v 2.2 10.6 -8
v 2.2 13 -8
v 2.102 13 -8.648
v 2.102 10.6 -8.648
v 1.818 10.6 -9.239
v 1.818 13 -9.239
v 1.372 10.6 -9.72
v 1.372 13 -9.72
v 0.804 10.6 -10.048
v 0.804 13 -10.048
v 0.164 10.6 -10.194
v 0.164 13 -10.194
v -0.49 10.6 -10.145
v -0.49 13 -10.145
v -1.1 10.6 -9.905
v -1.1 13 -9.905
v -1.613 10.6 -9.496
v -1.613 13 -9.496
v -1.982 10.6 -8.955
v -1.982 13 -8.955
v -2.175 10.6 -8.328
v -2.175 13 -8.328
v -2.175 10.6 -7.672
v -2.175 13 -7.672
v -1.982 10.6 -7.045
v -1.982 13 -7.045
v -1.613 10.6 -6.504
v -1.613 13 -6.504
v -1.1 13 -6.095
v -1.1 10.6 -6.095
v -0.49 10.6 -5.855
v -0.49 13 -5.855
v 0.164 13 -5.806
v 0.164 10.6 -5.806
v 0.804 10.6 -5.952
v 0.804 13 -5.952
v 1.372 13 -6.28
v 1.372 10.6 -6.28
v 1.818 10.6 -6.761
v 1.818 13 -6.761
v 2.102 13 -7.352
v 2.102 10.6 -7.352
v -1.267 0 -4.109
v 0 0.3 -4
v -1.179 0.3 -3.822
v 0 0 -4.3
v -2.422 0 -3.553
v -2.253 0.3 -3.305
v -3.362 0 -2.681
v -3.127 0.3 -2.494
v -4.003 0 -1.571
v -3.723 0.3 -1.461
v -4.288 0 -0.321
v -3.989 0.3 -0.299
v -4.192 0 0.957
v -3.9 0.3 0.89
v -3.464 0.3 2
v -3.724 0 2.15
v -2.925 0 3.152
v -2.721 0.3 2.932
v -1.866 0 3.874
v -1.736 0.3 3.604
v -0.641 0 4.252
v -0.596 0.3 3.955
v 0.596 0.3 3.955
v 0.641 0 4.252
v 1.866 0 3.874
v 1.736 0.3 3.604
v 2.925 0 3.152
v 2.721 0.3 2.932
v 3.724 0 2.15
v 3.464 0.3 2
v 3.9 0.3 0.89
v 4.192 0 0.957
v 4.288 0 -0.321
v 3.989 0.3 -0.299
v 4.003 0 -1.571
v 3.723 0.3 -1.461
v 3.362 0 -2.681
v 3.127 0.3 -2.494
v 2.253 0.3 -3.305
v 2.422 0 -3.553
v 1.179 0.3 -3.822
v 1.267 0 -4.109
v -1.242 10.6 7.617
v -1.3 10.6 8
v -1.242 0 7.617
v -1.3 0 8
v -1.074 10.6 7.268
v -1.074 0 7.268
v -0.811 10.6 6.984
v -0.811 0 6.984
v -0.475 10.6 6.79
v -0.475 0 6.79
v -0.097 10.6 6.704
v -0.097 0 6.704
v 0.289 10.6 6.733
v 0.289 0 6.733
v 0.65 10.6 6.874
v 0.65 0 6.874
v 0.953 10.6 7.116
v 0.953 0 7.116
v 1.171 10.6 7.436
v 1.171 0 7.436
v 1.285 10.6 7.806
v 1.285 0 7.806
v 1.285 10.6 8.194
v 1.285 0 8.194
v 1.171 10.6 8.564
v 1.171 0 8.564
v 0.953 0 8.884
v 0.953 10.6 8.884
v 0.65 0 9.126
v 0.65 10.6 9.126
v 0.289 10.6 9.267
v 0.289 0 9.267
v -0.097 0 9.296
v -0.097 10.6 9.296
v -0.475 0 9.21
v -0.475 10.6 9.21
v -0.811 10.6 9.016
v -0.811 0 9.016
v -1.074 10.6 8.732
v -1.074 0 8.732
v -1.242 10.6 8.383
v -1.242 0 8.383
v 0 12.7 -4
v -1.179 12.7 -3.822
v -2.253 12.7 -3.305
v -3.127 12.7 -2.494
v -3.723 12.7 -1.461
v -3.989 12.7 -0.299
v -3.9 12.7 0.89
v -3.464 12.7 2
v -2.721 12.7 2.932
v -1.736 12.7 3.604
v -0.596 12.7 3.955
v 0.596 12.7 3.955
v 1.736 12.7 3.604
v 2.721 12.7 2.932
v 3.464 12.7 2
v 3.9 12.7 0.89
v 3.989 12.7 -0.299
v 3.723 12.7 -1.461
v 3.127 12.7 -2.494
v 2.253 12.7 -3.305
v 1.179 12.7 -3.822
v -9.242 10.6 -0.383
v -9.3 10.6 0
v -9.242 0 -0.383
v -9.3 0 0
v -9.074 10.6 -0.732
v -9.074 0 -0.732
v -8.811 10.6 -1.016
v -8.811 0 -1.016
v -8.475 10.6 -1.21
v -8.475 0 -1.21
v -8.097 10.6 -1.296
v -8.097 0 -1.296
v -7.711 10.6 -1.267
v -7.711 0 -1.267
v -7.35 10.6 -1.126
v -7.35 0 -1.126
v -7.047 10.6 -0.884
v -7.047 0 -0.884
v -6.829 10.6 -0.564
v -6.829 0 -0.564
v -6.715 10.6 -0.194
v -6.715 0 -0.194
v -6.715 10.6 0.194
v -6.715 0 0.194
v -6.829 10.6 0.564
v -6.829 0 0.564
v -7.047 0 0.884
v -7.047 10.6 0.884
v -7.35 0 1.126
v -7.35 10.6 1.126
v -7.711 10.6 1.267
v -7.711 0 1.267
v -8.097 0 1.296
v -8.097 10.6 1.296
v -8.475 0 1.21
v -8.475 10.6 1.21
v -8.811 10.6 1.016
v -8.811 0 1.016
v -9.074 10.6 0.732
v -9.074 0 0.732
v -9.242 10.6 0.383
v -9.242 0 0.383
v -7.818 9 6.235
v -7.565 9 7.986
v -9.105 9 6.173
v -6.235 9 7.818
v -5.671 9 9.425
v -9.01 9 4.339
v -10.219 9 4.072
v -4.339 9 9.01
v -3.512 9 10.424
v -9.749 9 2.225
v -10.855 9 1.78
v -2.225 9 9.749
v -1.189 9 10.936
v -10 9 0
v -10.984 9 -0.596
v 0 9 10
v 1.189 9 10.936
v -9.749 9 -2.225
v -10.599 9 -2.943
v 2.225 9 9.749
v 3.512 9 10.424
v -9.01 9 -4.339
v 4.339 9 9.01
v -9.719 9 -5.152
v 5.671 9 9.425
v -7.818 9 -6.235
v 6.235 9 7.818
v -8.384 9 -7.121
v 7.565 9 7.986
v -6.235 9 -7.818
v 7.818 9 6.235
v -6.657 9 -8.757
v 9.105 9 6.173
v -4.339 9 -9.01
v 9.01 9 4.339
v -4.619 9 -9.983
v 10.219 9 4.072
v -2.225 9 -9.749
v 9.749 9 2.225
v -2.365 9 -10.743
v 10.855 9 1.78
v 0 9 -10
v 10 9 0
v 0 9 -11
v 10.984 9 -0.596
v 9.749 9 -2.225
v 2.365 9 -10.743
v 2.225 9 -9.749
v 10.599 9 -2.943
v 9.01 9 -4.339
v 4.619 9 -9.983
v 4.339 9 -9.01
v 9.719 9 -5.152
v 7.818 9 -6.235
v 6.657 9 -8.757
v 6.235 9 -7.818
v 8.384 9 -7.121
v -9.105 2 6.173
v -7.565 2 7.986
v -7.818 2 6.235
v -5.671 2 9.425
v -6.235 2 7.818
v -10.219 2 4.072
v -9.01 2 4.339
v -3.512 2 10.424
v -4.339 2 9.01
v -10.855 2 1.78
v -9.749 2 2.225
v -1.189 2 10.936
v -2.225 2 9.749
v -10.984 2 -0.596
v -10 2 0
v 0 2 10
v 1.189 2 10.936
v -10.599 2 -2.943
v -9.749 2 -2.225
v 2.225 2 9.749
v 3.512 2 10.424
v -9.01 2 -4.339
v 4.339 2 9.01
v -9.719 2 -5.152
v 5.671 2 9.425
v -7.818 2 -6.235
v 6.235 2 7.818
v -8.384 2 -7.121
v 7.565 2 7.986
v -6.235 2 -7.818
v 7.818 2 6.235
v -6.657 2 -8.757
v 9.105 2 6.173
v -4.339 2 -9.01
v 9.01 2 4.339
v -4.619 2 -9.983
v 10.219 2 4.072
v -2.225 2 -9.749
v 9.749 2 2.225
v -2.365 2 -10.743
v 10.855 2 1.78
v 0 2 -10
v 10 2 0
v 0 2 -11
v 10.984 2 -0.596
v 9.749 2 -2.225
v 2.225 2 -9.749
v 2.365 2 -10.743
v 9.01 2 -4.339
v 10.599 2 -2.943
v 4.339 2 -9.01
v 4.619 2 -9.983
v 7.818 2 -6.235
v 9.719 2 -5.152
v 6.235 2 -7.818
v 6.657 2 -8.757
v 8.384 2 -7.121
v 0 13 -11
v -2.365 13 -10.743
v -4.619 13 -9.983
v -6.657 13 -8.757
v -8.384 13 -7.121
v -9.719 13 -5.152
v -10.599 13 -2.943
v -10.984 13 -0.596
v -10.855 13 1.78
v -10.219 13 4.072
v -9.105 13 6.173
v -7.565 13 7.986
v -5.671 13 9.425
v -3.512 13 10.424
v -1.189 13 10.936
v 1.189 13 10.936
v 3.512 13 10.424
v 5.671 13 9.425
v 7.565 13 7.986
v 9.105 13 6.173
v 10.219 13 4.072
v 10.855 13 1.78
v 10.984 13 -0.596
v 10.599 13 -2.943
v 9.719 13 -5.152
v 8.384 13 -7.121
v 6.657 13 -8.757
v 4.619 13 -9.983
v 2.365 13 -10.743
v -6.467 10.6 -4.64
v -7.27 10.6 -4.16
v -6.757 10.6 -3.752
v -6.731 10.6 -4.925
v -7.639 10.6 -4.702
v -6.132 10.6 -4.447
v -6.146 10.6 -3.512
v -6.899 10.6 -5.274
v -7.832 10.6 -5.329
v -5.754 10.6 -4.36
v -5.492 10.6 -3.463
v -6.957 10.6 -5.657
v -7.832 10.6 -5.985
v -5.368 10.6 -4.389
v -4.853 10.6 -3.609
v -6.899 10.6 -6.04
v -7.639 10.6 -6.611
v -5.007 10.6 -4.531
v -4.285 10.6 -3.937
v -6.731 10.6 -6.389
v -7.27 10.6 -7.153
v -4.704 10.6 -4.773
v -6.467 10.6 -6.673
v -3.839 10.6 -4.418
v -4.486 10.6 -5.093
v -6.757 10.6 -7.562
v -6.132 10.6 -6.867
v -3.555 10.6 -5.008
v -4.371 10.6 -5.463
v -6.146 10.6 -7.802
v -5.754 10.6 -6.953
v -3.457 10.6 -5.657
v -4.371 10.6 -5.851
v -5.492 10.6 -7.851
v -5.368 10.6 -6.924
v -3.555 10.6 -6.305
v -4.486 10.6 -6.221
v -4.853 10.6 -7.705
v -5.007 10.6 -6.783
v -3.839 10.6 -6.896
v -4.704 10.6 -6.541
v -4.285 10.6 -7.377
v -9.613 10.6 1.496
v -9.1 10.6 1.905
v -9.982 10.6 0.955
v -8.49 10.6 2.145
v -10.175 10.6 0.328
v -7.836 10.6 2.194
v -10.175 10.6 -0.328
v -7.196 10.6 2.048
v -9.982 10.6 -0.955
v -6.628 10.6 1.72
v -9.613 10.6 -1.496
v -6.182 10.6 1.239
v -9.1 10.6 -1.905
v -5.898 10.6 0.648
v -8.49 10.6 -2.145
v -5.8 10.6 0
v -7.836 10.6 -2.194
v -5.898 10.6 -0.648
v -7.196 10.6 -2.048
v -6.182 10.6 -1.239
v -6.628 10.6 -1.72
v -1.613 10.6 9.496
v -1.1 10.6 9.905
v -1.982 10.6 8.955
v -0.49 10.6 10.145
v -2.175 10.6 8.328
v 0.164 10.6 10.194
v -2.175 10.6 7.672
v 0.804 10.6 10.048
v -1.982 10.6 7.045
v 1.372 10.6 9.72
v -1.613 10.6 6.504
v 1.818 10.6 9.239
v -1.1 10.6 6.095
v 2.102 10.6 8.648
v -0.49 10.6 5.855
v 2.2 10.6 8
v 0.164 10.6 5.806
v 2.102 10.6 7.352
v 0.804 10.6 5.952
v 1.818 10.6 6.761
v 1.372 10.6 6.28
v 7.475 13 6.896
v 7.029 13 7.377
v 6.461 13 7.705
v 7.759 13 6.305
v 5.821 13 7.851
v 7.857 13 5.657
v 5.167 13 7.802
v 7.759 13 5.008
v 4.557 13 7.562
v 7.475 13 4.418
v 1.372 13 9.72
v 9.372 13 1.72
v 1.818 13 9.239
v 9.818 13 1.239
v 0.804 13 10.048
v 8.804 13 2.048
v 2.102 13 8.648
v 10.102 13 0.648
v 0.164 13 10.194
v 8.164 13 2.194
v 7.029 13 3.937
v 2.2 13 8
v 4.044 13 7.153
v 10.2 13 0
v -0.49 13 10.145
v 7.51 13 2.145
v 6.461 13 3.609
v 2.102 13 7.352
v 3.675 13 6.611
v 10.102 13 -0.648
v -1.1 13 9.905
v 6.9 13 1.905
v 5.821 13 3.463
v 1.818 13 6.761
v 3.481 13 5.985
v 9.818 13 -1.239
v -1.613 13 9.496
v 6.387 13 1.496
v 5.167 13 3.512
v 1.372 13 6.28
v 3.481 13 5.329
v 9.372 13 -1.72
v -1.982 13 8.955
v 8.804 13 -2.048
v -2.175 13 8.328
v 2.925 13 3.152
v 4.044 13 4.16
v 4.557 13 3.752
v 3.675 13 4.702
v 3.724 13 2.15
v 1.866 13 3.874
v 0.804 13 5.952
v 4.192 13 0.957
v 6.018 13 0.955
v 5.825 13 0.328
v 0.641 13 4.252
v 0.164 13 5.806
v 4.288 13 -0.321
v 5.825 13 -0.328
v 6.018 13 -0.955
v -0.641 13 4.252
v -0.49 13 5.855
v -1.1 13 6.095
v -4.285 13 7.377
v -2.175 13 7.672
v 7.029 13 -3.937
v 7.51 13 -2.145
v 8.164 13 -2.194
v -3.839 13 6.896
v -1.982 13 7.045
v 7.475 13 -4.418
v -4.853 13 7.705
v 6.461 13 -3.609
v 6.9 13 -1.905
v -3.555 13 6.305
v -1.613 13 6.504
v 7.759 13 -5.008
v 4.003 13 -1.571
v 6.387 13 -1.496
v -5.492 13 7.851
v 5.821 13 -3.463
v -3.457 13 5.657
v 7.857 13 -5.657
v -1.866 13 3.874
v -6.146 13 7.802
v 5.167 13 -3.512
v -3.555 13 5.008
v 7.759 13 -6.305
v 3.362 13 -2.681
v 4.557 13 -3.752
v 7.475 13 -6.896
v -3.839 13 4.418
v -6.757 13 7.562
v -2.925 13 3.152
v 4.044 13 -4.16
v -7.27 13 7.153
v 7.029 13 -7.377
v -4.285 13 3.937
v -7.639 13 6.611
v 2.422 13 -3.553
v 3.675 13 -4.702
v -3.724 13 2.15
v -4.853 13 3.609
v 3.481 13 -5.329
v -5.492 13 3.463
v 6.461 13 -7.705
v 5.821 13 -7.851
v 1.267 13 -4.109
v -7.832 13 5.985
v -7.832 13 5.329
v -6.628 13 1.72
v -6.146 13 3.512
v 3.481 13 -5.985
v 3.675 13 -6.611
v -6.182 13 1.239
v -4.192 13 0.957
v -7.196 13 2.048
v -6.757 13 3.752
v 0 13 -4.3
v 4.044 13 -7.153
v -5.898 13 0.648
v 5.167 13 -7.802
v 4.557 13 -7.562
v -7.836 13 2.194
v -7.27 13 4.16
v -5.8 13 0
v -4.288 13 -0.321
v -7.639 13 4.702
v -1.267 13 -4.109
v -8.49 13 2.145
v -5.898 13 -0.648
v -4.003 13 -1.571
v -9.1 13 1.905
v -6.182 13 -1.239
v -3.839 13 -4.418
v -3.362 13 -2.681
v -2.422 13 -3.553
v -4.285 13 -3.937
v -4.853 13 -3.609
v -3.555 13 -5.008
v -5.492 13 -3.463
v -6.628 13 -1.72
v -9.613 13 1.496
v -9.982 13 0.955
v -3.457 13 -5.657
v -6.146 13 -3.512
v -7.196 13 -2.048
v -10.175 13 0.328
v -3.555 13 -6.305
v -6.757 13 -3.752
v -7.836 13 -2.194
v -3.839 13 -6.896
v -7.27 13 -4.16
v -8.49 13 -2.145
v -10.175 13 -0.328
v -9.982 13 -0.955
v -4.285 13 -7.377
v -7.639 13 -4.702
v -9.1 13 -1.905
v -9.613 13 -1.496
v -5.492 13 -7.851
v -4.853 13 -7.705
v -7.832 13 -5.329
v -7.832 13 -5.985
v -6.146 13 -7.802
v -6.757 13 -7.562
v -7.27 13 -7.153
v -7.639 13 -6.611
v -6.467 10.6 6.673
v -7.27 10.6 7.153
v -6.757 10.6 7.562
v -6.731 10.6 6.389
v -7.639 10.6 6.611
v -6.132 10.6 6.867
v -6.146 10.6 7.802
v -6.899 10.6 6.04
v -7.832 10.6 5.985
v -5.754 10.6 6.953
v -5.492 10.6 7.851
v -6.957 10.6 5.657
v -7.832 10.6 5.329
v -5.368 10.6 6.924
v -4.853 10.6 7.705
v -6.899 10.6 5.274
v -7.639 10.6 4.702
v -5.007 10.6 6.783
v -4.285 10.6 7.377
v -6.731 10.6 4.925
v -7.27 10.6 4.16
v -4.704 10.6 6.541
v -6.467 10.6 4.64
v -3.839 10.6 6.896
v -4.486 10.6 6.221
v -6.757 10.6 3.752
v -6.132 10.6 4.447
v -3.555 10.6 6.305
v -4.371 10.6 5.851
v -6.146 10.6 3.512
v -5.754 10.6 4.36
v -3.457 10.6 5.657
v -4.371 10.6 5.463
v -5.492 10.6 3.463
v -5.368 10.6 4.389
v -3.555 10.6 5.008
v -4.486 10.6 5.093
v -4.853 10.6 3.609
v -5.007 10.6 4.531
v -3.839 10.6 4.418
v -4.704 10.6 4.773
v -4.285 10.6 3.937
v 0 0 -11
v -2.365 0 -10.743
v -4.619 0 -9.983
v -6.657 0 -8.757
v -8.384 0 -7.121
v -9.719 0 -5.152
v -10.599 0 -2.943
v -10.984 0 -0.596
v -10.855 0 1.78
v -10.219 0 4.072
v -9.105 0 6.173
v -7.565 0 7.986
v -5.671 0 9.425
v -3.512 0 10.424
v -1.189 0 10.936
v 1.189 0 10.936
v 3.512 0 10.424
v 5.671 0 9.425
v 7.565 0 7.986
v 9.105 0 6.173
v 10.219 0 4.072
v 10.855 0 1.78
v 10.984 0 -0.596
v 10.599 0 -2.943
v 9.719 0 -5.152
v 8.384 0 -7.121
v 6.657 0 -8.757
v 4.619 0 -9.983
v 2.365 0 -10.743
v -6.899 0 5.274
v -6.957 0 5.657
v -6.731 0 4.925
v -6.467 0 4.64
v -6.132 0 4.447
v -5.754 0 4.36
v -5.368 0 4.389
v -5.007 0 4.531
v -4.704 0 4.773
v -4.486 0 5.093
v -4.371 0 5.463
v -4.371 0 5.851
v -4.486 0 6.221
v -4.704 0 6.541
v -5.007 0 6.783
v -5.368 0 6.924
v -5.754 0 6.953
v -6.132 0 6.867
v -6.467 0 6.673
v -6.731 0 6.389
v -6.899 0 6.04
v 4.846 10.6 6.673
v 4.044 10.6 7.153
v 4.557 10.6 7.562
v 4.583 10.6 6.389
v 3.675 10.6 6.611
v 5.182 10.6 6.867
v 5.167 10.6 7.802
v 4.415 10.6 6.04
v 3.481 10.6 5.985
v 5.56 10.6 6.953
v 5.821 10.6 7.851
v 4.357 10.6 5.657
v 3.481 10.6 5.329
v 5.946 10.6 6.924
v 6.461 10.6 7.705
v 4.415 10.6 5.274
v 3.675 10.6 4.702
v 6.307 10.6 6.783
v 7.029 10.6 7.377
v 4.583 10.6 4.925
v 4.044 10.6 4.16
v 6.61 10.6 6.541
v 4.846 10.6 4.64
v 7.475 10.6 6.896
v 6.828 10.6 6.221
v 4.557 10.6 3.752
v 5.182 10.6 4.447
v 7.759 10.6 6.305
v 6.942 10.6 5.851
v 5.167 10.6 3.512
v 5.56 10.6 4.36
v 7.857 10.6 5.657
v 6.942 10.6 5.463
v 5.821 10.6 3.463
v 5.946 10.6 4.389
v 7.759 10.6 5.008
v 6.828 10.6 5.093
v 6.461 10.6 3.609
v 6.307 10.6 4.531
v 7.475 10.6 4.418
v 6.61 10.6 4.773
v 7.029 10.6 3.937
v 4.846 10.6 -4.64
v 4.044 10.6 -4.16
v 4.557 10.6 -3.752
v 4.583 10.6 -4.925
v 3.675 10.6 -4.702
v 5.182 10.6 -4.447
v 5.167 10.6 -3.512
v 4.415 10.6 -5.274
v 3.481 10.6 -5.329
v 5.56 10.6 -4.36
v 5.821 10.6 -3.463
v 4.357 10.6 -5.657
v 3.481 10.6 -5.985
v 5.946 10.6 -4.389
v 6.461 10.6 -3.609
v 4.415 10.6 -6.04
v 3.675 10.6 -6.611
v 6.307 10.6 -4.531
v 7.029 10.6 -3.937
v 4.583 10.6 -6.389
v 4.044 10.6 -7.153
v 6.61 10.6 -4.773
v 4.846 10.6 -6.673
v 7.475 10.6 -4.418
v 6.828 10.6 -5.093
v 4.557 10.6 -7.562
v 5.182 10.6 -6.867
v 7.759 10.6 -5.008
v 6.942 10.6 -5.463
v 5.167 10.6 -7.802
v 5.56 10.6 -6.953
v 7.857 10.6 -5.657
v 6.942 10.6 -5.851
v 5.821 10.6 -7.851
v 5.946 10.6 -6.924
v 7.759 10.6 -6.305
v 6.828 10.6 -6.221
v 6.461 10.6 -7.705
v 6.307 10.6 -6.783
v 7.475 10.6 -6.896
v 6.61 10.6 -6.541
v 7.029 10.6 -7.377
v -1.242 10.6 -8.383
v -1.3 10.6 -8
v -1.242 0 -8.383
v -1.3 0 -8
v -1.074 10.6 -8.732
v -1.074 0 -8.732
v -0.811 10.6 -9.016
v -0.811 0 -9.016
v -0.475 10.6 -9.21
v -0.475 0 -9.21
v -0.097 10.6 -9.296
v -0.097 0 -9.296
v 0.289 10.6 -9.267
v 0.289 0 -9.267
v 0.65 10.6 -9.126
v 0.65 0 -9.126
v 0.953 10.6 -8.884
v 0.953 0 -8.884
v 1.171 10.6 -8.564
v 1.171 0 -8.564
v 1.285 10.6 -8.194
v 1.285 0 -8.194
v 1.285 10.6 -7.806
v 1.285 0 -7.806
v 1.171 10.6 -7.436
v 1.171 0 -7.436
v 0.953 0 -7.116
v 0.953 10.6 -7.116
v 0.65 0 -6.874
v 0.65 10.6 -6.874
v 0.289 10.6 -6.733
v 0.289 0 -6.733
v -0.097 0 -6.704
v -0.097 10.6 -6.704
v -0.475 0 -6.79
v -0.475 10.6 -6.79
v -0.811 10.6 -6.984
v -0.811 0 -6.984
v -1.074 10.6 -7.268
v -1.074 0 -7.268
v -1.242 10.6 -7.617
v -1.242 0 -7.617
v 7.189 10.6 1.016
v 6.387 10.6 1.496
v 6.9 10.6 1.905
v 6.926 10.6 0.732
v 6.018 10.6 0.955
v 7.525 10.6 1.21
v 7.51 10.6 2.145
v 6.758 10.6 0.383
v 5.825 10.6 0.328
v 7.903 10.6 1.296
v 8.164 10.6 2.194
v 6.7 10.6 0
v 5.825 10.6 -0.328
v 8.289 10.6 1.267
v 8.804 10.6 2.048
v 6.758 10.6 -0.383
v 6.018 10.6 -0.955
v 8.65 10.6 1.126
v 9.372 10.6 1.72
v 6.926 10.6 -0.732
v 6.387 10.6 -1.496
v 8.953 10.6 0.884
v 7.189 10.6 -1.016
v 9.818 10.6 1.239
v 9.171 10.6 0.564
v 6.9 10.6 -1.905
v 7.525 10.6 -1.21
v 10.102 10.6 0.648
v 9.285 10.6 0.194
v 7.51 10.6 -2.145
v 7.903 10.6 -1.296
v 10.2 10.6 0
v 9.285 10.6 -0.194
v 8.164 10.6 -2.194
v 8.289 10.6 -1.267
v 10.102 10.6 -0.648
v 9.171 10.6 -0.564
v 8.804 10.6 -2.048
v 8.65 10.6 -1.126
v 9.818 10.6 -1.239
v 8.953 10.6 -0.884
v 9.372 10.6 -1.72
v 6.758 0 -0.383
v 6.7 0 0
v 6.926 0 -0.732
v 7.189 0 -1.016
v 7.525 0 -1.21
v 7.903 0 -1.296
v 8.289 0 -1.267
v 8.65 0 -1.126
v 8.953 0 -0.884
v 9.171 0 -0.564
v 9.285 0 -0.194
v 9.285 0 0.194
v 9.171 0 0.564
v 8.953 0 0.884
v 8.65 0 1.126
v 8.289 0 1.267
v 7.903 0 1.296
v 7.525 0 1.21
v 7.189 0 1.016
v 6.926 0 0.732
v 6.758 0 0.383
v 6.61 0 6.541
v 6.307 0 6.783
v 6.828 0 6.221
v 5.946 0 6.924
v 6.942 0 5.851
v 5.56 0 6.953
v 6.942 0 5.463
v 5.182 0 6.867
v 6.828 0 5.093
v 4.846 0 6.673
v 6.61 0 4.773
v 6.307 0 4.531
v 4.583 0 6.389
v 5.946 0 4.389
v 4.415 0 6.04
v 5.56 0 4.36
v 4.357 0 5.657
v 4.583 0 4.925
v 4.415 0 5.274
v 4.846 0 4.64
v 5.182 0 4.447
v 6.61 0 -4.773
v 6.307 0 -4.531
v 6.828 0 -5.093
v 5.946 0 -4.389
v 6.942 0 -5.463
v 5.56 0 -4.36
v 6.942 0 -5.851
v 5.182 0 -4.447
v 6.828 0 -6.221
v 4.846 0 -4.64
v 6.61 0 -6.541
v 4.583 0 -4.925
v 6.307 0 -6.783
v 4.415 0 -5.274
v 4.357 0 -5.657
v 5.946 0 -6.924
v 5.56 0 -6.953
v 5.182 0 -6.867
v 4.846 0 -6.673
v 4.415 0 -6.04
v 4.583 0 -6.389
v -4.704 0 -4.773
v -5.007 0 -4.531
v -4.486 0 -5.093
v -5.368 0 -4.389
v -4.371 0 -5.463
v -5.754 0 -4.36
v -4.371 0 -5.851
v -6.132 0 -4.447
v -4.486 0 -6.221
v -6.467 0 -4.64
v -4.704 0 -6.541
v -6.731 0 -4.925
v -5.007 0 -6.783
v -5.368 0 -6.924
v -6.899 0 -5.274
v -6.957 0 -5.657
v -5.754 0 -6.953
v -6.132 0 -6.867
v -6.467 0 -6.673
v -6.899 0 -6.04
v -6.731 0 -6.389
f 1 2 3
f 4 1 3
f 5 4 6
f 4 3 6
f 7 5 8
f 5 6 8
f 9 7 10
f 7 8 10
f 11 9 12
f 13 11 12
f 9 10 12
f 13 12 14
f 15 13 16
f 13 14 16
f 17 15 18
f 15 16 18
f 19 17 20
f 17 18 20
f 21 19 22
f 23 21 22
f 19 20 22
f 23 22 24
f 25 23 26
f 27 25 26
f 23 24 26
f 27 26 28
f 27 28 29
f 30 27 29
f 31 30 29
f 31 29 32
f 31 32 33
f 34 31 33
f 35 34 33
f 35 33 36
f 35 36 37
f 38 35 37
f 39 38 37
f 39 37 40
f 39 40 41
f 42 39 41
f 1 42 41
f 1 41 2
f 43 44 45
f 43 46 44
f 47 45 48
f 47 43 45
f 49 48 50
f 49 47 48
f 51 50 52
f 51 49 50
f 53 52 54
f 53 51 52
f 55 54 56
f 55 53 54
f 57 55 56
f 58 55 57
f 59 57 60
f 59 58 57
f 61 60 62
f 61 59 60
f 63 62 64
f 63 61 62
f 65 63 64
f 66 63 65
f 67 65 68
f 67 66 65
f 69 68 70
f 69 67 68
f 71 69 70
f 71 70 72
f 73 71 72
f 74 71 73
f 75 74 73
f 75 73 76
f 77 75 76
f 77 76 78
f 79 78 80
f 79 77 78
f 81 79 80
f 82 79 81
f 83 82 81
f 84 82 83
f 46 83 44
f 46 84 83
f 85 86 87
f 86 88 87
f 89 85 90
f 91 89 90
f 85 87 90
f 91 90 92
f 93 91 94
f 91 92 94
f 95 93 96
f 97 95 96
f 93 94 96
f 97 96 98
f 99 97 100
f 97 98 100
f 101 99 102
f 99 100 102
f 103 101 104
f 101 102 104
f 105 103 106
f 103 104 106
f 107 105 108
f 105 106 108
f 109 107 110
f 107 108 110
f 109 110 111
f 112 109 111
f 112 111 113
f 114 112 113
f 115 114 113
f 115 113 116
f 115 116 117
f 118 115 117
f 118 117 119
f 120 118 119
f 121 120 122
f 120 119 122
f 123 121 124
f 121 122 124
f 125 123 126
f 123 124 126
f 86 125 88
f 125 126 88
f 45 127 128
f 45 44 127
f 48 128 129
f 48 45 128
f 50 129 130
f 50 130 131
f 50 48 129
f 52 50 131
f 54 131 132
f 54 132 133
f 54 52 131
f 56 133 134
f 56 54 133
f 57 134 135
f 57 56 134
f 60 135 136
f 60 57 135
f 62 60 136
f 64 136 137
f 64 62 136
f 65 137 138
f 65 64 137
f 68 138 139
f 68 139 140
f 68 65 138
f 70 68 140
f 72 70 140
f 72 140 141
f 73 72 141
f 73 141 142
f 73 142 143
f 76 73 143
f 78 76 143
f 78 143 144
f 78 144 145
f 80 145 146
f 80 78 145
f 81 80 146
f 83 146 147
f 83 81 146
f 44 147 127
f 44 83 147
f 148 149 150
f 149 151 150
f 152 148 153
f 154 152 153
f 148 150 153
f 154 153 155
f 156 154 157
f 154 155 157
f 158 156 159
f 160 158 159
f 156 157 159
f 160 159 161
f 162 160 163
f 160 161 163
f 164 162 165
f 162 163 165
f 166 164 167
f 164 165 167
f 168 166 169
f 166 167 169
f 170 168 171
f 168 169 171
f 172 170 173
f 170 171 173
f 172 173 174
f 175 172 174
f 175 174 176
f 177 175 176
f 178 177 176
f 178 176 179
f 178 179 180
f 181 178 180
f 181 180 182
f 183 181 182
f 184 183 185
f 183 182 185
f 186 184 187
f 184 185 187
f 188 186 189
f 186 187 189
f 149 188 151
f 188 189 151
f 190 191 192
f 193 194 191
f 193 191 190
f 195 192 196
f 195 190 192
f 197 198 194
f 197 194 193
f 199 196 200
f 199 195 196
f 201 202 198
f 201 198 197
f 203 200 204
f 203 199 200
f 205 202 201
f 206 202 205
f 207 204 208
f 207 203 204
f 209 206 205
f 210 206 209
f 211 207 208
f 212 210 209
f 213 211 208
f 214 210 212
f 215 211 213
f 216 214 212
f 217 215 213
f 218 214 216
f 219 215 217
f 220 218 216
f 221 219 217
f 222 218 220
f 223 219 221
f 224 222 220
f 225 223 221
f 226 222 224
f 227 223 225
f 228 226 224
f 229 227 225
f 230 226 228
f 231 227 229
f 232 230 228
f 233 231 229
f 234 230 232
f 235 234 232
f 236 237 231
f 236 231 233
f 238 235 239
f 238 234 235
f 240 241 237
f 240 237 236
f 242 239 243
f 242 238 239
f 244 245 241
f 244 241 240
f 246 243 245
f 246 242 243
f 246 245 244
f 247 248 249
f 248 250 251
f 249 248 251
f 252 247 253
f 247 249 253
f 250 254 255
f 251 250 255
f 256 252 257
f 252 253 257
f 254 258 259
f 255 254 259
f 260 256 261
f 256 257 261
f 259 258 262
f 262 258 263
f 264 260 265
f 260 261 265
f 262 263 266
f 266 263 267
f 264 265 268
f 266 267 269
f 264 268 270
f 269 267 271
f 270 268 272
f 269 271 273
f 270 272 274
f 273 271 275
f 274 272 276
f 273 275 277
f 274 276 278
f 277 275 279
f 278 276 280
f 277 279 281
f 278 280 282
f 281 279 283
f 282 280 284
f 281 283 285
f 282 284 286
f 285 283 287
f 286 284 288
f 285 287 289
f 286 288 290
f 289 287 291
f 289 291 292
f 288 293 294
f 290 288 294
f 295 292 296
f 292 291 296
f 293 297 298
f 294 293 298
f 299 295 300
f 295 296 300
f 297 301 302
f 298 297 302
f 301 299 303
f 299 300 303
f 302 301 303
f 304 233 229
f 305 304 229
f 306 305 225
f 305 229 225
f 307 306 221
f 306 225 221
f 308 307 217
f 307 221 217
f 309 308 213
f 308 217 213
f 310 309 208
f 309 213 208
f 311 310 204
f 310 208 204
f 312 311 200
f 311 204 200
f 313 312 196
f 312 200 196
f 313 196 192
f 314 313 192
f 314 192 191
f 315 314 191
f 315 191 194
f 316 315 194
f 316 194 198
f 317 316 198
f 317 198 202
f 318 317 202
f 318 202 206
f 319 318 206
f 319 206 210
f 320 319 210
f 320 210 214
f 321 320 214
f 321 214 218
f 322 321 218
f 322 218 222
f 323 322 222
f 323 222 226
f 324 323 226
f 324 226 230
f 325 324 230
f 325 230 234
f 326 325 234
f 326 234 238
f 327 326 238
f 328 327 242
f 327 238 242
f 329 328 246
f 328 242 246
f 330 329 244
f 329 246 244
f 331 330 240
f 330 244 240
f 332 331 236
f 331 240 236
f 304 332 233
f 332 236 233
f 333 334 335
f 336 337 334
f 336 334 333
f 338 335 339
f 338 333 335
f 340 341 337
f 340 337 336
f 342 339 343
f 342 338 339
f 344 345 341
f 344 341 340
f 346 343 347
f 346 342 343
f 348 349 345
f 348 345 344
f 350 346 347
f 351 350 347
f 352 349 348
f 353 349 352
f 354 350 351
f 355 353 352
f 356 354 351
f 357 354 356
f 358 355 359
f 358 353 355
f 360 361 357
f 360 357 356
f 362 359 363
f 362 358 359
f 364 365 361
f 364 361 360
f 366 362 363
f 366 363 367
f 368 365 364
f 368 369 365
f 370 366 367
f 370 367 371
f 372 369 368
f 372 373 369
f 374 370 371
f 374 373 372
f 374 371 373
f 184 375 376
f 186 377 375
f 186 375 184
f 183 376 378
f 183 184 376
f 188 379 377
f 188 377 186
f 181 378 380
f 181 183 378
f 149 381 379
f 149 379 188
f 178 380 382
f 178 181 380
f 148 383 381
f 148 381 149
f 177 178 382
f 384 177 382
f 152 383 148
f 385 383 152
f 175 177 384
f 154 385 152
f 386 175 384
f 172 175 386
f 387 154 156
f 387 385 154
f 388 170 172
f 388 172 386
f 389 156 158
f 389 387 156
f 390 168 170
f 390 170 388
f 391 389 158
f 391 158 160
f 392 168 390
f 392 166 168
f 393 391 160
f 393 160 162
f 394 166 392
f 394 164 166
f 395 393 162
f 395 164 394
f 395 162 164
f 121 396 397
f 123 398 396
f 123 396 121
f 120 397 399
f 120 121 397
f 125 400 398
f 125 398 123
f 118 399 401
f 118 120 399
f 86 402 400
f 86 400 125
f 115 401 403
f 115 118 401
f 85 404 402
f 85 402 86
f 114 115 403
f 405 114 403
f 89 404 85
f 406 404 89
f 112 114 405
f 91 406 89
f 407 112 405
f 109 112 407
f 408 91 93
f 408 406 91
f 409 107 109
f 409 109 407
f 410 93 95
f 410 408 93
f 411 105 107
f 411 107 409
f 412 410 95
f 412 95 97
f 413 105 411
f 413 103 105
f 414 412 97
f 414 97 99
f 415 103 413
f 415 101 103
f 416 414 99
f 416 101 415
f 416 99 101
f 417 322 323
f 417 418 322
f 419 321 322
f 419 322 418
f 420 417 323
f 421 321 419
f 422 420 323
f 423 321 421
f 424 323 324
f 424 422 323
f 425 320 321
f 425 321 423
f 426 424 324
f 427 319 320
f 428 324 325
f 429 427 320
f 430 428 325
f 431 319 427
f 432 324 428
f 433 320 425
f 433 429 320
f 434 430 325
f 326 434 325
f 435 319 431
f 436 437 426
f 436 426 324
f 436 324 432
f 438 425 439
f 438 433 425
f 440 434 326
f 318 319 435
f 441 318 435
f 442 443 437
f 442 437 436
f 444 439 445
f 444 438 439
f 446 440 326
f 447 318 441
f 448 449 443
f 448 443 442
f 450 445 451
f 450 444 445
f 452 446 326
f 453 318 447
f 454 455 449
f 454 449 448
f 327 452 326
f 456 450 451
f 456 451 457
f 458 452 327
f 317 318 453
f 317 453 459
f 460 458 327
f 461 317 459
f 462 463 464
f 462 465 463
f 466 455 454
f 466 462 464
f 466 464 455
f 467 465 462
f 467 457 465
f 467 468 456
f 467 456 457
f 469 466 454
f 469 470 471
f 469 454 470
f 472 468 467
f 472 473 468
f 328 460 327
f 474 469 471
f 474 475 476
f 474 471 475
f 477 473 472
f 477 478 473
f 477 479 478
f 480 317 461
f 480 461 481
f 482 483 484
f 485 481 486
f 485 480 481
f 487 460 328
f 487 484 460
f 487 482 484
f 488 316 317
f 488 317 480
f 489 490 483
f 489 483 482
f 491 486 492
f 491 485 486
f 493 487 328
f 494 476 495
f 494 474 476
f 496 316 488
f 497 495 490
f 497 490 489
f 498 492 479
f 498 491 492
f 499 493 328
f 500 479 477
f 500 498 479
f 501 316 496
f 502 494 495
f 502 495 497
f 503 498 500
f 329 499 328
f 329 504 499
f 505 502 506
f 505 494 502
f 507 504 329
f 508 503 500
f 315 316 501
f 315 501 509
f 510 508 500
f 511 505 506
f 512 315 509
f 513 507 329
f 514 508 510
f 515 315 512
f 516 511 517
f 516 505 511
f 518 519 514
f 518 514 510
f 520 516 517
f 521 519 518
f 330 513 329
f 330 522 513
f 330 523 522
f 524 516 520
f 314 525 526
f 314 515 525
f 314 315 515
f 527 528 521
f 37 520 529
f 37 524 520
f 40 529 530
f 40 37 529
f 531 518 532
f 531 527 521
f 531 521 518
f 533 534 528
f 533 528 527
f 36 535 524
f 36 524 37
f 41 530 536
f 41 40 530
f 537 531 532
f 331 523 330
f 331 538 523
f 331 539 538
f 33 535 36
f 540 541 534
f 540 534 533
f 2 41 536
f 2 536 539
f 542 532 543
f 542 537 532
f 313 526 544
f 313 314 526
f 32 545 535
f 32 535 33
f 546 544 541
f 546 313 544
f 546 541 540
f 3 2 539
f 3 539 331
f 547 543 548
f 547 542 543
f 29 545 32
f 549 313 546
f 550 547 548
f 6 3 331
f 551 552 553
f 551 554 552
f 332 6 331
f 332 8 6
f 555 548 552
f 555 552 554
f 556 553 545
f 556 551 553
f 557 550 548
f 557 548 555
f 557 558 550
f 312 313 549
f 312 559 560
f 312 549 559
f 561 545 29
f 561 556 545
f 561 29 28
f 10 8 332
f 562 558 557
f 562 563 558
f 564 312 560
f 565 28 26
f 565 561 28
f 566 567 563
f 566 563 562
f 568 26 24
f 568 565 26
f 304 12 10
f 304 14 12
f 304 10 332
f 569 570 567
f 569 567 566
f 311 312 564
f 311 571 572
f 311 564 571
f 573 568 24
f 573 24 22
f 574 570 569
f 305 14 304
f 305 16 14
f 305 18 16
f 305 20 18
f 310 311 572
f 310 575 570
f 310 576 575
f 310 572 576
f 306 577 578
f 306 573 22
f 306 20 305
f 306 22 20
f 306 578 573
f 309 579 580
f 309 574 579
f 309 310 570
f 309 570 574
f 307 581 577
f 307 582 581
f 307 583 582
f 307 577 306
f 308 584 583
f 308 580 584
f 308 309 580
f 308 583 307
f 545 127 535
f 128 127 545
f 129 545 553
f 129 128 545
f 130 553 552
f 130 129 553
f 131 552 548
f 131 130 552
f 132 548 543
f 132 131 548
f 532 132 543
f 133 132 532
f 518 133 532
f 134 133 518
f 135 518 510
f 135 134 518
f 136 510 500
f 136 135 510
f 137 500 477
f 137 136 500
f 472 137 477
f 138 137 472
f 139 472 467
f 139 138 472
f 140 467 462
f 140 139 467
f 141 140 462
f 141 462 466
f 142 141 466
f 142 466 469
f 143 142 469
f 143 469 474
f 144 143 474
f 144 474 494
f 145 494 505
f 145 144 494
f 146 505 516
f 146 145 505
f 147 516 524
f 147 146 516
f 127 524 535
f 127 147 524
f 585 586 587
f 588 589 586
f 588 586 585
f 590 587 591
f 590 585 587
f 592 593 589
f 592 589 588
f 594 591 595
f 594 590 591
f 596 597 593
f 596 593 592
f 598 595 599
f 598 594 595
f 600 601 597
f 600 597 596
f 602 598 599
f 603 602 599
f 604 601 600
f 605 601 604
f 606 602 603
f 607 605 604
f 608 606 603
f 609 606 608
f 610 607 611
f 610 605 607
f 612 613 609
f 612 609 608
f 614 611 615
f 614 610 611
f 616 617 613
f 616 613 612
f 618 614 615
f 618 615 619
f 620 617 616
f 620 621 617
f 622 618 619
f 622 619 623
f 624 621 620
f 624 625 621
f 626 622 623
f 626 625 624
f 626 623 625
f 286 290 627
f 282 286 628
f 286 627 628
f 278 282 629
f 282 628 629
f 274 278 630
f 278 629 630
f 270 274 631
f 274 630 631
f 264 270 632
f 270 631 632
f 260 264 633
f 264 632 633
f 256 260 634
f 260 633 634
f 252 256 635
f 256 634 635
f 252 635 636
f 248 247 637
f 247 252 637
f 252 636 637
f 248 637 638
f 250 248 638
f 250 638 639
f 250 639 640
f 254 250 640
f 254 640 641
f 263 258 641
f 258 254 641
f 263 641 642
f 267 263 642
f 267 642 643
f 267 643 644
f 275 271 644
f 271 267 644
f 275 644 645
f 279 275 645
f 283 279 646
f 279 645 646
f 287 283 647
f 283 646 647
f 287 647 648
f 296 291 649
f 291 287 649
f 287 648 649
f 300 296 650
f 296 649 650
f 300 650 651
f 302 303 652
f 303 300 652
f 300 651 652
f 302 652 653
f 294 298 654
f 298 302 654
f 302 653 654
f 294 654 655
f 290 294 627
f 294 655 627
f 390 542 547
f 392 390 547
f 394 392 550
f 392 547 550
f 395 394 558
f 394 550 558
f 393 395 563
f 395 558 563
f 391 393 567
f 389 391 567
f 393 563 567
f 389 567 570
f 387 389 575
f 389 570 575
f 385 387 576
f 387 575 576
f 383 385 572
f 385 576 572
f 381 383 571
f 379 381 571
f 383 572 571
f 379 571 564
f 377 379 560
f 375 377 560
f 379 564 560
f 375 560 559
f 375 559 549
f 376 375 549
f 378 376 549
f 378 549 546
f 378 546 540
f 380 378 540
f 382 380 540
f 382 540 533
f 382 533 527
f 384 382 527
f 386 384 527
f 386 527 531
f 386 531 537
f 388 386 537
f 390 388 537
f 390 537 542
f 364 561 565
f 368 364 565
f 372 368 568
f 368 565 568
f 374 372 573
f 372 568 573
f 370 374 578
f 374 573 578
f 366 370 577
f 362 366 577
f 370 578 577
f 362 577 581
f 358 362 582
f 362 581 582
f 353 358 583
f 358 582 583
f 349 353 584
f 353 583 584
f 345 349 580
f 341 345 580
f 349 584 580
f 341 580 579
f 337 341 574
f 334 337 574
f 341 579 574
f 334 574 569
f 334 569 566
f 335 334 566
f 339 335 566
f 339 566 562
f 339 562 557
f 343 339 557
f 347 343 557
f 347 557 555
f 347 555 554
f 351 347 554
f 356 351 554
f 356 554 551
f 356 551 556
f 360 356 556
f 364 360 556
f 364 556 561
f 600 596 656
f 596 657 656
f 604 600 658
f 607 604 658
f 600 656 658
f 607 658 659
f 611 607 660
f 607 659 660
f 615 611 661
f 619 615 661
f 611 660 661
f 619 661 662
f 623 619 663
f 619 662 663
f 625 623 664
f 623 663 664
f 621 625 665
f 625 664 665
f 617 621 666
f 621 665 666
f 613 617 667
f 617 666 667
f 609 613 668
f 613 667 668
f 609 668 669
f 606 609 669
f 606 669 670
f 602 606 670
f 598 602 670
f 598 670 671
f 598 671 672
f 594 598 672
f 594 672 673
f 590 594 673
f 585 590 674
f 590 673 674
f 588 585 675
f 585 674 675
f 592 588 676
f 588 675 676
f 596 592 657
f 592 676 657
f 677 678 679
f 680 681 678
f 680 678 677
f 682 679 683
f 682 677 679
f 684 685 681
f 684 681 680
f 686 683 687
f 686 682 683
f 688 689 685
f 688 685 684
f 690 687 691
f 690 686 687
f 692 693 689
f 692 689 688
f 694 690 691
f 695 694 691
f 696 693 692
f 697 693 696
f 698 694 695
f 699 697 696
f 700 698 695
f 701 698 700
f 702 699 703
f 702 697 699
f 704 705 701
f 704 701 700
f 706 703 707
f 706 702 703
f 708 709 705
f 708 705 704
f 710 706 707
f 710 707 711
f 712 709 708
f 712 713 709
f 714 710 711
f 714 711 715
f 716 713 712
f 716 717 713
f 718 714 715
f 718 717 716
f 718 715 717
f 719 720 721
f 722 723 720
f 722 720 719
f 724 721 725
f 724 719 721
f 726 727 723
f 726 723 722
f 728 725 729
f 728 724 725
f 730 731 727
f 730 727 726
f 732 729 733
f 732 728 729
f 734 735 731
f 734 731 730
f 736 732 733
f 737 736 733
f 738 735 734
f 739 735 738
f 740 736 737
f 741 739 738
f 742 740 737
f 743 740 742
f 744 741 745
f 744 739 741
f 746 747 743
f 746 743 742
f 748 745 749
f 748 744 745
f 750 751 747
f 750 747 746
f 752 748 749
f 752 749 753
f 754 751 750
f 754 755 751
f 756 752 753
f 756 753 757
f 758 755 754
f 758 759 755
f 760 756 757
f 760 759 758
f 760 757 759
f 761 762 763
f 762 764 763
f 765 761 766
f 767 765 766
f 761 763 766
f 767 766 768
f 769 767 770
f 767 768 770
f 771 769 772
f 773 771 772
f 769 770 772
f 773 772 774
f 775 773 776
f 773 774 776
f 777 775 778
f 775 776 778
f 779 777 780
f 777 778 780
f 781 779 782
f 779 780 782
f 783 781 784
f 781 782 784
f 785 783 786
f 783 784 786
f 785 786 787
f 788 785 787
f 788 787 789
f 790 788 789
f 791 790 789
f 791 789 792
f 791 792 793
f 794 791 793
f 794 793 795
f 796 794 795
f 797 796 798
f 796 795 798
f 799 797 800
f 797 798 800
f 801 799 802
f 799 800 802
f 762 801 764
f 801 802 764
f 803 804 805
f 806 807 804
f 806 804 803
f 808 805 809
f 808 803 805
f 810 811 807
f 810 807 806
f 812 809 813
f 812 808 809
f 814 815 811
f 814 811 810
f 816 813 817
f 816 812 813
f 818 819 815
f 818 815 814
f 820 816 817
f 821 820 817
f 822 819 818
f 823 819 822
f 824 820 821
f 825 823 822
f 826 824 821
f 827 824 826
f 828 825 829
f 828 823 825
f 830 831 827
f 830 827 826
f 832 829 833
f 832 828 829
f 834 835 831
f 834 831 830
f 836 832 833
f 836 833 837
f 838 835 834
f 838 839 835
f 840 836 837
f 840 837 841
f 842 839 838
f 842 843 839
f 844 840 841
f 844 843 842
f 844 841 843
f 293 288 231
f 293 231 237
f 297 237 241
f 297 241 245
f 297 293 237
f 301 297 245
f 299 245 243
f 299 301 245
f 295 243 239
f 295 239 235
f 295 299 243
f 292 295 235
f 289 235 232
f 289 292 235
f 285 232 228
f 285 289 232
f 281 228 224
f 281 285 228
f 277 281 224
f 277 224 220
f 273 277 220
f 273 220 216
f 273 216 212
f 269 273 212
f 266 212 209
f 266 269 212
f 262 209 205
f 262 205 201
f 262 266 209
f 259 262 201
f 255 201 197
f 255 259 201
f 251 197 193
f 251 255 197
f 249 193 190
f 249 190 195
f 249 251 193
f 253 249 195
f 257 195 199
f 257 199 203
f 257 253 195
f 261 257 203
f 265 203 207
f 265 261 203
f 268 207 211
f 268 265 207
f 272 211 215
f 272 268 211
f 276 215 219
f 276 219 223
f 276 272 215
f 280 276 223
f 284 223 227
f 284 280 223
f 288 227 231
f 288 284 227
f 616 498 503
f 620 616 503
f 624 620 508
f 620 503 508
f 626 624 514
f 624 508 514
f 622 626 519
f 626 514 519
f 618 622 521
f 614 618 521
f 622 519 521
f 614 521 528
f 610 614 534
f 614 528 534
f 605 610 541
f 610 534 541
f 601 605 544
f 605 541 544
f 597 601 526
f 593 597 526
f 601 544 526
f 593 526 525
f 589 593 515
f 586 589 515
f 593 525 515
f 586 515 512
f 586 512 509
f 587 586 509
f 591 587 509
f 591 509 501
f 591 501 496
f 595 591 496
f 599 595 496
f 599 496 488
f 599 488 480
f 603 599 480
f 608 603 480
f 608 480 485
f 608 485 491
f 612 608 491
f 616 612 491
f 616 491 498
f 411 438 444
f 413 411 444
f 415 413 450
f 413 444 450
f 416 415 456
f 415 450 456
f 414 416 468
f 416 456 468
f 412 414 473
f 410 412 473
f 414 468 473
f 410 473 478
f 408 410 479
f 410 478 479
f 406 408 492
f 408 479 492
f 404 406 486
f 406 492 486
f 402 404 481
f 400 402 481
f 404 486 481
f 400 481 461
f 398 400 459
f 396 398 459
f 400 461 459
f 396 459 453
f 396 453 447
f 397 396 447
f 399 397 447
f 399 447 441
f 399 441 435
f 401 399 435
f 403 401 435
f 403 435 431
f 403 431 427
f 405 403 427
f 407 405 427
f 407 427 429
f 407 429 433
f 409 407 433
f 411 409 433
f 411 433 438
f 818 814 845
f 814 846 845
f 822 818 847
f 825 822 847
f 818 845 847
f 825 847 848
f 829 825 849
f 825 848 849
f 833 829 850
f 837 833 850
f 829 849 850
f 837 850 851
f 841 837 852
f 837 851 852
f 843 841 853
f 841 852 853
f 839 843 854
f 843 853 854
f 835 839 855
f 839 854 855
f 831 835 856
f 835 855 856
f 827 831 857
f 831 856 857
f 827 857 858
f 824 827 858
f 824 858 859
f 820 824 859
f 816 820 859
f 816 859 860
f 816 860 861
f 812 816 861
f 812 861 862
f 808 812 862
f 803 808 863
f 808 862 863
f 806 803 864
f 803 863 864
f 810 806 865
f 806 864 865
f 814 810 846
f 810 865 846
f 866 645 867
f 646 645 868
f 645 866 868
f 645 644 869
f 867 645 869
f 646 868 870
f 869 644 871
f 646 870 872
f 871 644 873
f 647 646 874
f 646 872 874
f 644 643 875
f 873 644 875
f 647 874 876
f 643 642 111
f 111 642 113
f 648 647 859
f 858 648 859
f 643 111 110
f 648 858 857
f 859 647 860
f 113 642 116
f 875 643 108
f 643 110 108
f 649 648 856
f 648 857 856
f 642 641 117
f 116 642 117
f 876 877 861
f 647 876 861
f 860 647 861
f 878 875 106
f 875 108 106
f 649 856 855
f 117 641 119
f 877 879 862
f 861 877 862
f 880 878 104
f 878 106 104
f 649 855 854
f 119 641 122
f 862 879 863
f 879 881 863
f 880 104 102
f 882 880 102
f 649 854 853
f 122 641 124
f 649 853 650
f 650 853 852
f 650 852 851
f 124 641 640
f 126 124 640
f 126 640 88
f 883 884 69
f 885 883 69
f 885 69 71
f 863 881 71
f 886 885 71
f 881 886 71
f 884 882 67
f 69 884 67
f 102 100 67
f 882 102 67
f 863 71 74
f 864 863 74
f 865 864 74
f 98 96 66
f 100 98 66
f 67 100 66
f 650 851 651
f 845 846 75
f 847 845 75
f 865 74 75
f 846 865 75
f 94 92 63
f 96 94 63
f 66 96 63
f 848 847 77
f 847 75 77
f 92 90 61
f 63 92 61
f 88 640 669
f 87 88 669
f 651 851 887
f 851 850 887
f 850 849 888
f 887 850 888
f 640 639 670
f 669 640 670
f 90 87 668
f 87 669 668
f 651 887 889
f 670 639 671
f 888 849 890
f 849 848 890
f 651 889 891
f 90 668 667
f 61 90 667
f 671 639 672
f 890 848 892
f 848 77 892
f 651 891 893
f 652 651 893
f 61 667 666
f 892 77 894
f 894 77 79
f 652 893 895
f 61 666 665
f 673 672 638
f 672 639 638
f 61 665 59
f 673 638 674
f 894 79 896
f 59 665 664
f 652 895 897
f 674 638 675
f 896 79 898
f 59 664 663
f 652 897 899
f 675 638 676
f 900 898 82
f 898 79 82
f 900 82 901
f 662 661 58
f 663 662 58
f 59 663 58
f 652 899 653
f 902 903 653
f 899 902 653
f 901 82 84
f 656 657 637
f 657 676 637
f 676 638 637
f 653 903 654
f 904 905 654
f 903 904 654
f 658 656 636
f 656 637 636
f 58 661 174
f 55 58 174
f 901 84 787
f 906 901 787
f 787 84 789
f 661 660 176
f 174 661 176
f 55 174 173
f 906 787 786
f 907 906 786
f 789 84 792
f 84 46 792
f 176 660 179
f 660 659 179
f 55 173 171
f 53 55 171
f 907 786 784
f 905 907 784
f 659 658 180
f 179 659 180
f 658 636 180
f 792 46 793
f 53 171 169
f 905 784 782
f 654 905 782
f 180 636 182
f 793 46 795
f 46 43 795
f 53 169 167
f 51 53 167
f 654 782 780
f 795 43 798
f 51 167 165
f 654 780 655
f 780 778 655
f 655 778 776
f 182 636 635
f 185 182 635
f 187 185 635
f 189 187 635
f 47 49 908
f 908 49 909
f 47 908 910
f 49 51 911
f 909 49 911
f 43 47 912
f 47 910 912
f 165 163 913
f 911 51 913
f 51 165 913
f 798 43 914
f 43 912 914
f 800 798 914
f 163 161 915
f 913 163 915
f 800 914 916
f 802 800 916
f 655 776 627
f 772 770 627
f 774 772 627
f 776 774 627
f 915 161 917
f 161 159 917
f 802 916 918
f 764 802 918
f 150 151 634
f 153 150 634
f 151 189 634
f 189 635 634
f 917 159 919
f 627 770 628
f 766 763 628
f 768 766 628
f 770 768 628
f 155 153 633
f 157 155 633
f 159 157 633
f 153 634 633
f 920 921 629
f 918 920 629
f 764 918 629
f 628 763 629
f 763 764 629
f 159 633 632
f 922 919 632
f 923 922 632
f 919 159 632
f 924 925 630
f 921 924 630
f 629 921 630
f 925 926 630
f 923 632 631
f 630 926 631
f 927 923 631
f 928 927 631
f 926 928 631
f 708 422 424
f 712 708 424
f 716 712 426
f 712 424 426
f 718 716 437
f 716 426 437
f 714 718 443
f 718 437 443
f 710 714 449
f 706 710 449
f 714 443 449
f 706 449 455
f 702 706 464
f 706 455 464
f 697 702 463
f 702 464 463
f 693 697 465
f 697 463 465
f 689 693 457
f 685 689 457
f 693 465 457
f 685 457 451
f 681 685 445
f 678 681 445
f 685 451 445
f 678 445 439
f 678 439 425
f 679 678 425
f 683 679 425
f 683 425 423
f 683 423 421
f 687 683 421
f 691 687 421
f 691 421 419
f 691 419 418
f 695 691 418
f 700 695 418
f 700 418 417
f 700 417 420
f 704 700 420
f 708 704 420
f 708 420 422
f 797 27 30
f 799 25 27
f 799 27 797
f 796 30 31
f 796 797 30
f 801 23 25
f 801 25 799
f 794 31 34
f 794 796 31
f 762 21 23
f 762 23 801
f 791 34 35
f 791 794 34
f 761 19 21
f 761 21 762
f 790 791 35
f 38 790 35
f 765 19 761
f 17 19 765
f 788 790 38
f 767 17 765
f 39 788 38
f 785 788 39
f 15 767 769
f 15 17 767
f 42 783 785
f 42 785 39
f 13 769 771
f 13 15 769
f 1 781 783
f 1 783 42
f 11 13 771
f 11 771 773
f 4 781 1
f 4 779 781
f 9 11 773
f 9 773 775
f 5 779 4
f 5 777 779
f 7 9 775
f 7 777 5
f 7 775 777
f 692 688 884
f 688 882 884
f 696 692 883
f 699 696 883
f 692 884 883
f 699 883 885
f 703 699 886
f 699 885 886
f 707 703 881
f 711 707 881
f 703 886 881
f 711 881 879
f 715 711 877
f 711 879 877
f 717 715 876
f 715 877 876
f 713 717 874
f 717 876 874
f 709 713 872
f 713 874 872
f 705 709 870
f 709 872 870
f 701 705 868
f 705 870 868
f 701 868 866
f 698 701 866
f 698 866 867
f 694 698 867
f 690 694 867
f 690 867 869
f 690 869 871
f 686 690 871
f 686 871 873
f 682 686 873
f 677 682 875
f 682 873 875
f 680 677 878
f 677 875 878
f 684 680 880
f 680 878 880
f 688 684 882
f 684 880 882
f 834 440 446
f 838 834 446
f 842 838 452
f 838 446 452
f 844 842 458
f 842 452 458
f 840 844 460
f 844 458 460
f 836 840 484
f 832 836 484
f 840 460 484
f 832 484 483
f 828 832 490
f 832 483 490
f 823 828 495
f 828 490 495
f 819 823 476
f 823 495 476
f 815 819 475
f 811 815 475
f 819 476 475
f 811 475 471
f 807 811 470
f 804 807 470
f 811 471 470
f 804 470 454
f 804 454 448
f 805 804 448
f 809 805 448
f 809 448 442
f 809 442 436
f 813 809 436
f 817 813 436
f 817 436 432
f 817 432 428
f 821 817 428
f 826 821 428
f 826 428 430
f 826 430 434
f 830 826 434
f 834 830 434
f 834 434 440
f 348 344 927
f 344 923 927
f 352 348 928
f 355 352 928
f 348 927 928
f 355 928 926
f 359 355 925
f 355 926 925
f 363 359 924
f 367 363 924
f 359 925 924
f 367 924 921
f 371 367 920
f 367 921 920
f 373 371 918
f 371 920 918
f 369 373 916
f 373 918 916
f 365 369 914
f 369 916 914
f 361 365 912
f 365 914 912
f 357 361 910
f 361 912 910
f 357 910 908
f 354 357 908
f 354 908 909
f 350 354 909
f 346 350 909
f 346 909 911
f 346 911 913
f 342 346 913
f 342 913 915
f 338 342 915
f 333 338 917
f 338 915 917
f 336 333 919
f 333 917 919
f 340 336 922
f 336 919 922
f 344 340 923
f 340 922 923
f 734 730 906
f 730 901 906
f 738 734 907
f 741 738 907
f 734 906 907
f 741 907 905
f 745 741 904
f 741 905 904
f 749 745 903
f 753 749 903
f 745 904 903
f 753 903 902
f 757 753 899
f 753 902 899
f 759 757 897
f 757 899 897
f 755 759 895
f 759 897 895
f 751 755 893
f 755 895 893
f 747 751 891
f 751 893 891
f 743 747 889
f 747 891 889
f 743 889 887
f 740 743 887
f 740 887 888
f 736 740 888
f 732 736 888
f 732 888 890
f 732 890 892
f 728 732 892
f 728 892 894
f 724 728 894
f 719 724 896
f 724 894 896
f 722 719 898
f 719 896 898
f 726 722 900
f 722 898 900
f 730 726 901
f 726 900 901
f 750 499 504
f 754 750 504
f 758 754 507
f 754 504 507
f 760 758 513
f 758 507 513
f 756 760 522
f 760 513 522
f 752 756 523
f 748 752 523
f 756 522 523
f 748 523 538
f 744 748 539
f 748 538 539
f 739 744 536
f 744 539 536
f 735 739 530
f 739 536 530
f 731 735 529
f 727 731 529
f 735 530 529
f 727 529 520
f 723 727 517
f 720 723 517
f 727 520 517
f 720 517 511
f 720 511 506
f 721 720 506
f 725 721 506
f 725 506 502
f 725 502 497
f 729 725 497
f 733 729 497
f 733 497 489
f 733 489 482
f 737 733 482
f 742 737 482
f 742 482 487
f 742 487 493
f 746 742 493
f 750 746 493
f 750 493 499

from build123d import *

# Parameters (mm, degrees)
SKETCH1_R                                           = 11
BOSS_EXTRUDE1_DEPTH                                 = 13
CBORE_FOR_M2_HEX_SOCKET_HEAD_CAP_SCREW1_D           = 2.6
CBORE_FOR_M2_HEX_SOCKET_HEAD_CAP_SCREW1_CBORE_D     = 4.4
CBORE_FOR_M2_HEX_SOCKET_HEAD_CAP_SCREW1_CBORE_DEPTH = 2.4
CUT_EXTRUDE1_START                                  = -2
SKETCH8_R                                           = 11
SKETCH8_R_2                                         = 10
CUT_EXTRUDE1_DEPTH                                  = 7


with BuildPart() as part:
    # Sketch1 → Boss-Extrude1 (new body)
    with BuildSketch(Plane(origin=(0, 0, 0), x_dir=(1, 0, 0), z_dir=(0, 1, 0))):
        with Locations(Location((0, 0, 0), (0, 0, 90))):
            Circle(SKETCH1_R)
    extrude(amount=BOSS_EXTRUDE1_DEPTH)

    # CBORE for M2 Hex Socket Head Cap Screw1 (through all)
    with Locations(Plane(origin=(0, 13, 0), x_dir=(1, 0, 0), z_dir=(0, 1, 0))):
        with Locations((-5.656854249, 5.656854249), (0, 8), (5.656854249, 5.656854249), (8, 0), (5.656854249, -5.656854249), (0, -8), (-5.656854249, -5.656854249), (-8, 0)):
            CounterBoreHole(CBORE_FOR_M2_HEX_SOCKET_HEAD_CAP_SCREW1_D / 2, CBORE_FOR_M2_HEX_SOCKET_HEAD_CAP_SCREW1_CBORE_D / 2, CBORE_FOR_M2_HEX_SOCKET_HEAD_CAP_SCREW1_CBORE_DEPTH)

    # Sketch8 → Cut-Extrude1 (cut)
    with BuildSketch(Plane.XZ.offset(CUT_EXTRUDE1_START)):
        with Locations(Location((0, 0, 0), (0, 0, 270))):
            Circle(SKETCH8_R)
        with Locations(Location((0, 0, 0), (0, 0, 270))):
            Circle(SKETCH8_R_2, mode=Mode.SUBTRACT)
    extrude(amount=-CUT_EXTRUDE1_DEPTH, mode=Mode.SUBTRACT)

    # Sketch12 → Ø8.0mm Dowel Hole1 (revolve, cut)
    with BuildSketch(Plane(origin=(0, 0, 0), x_dir=(0, 0, -1), z_dir=(1, 0, 0))):
        Polygon((0, 0), (0, 13), (4.3, 13), (4, 12.7), (4, 0.3), (4.3, 0), align=None)
    revolve(axis=Axis((0, -6.35, 0), (0, 1, 0)), mode=Mode.SUBTRACT)


solid = part.part
